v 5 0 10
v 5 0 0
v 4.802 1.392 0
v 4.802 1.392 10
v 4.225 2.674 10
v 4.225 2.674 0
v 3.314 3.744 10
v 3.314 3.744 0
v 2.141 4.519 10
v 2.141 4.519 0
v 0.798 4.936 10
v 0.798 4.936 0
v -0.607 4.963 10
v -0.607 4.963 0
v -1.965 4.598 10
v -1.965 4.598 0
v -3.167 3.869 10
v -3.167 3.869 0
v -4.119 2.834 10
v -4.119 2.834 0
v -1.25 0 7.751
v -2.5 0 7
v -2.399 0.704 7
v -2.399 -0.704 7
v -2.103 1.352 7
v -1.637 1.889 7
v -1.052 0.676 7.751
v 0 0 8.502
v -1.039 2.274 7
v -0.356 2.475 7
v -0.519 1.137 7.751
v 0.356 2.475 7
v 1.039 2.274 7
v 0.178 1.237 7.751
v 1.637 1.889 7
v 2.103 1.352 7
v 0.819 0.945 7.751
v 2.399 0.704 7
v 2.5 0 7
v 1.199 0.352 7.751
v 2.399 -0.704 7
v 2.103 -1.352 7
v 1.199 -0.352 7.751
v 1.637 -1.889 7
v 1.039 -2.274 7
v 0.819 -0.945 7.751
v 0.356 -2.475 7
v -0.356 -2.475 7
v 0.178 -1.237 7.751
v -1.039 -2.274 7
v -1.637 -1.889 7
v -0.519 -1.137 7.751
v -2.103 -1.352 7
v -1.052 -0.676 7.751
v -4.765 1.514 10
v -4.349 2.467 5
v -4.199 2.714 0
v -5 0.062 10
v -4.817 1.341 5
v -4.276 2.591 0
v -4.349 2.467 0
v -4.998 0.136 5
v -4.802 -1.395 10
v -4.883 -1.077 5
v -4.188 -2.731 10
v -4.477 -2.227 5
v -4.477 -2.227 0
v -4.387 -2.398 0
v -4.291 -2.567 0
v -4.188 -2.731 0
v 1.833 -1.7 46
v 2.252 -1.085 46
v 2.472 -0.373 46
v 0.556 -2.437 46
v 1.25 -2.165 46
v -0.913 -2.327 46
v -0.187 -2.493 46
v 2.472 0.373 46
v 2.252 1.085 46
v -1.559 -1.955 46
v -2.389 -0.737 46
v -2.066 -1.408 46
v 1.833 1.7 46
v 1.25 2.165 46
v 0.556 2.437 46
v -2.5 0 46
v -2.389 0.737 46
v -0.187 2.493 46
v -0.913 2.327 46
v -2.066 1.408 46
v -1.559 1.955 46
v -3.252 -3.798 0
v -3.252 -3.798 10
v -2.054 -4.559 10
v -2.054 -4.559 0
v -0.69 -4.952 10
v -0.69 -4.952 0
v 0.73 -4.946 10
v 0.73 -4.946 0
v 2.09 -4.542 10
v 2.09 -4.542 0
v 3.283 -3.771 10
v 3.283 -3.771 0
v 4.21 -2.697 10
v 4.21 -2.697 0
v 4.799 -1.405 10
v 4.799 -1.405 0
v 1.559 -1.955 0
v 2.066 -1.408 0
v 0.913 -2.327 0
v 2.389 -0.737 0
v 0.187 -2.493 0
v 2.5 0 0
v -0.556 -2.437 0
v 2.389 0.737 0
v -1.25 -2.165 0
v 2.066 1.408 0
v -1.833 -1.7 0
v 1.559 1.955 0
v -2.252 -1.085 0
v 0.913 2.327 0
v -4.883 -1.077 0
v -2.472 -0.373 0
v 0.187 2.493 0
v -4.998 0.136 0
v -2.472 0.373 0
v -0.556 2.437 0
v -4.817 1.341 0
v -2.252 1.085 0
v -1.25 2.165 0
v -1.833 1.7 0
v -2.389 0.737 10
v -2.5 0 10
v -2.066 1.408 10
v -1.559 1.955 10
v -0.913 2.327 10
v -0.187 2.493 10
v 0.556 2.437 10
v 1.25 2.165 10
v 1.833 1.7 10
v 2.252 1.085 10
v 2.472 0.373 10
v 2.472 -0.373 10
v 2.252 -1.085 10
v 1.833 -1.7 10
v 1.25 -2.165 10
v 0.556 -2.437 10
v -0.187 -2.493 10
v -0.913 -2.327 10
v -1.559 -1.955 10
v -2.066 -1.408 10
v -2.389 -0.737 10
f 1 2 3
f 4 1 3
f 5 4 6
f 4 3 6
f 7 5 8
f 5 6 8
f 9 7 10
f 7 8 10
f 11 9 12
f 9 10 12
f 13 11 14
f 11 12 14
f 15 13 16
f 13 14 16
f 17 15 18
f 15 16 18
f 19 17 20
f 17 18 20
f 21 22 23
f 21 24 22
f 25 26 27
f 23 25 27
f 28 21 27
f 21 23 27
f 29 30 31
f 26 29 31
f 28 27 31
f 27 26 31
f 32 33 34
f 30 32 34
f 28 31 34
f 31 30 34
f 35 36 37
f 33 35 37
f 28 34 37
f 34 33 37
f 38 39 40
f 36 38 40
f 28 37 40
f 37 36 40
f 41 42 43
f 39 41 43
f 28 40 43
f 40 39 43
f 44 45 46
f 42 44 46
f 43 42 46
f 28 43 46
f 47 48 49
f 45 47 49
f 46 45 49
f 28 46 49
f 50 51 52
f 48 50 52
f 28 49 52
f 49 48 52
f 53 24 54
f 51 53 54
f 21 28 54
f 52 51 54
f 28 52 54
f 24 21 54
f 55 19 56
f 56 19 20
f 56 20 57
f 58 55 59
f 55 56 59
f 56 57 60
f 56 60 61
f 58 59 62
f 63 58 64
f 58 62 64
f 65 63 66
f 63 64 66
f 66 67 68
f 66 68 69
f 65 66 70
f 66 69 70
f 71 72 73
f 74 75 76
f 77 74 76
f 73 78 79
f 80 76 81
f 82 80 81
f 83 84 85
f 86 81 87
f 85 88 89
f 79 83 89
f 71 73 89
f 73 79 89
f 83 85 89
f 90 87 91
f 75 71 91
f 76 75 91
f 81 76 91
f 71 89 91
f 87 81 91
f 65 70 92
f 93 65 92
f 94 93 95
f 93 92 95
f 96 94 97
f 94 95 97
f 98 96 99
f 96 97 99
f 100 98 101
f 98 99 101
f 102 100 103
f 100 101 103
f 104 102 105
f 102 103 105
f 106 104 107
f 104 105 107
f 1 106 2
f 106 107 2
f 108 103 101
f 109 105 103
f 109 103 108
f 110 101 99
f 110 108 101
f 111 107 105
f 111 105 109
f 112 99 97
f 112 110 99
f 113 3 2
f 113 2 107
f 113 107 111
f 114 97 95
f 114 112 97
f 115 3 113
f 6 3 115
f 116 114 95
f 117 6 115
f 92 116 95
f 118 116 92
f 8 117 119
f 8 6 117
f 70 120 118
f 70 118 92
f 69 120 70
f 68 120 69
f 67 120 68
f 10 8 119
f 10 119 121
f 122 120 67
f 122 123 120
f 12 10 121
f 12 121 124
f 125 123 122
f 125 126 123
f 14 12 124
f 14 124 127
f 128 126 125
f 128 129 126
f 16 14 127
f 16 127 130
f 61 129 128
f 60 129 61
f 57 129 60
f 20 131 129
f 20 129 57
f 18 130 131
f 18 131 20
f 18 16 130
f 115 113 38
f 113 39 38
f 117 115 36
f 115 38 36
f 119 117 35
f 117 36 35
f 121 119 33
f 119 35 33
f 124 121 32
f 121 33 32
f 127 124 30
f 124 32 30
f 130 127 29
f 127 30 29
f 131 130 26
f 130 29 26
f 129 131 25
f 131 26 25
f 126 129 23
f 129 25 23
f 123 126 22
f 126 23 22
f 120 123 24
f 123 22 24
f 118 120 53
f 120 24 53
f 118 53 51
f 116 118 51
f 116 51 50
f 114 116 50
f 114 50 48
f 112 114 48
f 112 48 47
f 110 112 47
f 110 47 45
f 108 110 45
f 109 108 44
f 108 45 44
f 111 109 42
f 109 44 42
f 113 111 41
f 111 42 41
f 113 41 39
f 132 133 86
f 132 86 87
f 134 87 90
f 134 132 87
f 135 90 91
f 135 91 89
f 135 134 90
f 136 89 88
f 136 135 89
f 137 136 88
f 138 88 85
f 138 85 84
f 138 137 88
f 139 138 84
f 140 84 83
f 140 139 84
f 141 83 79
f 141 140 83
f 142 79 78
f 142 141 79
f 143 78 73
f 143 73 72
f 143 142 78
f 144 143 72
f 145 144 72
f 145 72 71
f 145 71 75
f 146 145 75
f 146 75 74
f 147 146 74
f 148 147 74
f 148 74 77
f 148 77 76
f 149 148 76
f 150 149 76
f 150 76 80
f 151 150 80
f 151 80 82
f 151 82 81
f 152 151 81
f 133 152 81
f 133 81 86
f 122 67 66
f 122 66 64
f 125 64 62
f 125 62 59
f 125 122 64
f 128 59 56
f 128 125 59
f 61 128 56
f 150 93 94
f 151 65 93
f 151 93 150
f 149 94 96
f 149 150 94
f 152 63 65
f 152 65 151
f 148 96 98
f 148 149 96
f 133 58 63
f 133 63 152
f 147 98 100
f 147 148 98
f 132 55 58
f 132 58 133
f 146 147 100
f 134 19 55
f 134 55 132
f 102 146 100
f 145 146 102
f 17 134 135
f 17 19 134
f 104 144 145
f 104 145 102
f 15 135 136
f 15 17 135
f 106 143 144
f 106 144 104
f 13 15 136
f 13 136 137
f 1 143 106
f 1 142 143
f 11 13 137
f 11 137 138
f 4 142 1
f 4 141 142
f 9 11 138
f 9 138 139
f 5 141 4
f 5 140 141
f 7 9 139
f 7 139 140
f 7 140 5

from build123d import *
from build123d.topology import SkipClean

# Parameters (mm, degrees)
ESQUISSE1_R             = 5
BASE_EXTRUSION_DEPTH    = 10
ESQUISSE2_R             = 2.5
BOSS_EXTRU_1_DEPTH      = 46
PER_AGE1_D              = 5
PER_AGE1_DEPTH          = 7
PER_AGE1_TIP            = 1.502151548
BOSS_EXTRU_2_DEPTH      = 5
ENL_V_MAT_EXTRU_1_DEPTH = 47.673600495


with BuildPart() as part:
    # Esquisse1 → Base-Extrusion (new body)
    with BuildSketch(Plane.XY):
        Circle(ESQUISSE1_R)
    extrude(amount=BASE_EXTRUSION_DEPTH)

    # Esquisse2 → Boss.-Extru.1 (add)
    with BuildSketch(Plane(origin=(0, 0, 0), x_dir=(-1, 0, 0), z_dir=(0, 0, -1))):
        Circle(ESQUISSE2_R)
    extrude(amount=-BOSS_EXTRU_1_DEPTH)

    # Perçage1
    with Locations(Plane(origin=(0, 0, 0), x_dir=(-1, 0, 0), z_dir=(0, 0, -1))):
        with Locations((0, 0)):
            Hole(PER_AGE1_D / 2, depth=PER_AGE1_DEPTH)
            with Locations((0, 0, -(PER_AGE1_DEPTH + PER_AGE1_TIP / 2))):  # 118° drill point
                Cone(0, PER_AGE1_D / 2, PER_AGE1_TIP, mode=Mode.SUBTRACT)

    # Esquisse5 → Boss.-Extru.2 (add)
    with BuildSketch(Plane(origin=(0, 0, 0), x_dir=(-1, 0, 0), z_dir=(0, 0, -1))):
        with BuildLine():
            Line((4.34918251, 2.466700528), (6.117596195, 2.466700528))
            Line((6.117596195, 2.466700528), (6.117596195, -2.226545612))
            Line((6.117596195, -2.226545612), (4.476884479, -2.226545612))
            ThreePointArc((4.476884479, -2.226545612), (4.998150103, 0.135998324), (4.34918251, 2.466700528))
        make_face()
    extrude(amount=-BOSS_EXTRU_2_DEPTH)

    # Esquisse8 → Enlèv. mat.-Extru.1 (cut, through all)
    with SkipClean():  # the faces are left unmerged after this step: merging them gives an invalid solid
        with BuildSketch(Plane(origin=(0, 0, 0), x_dir=(-1, 0, 0), z_dir=(0, 0, -1))):
            with BuildLine():
                Line((4.118975402, 2.834438505), (6.634265665, 2.834438505))
                Line((6.634265665, 2.834438505), (6.634265665, -2.731049489))
                Line((6.634265665, -2.731049489), (4.188241718, -2.731049489))
                ThreePointArc((4.188241718, -2.731049489), (4.999612807, 0.062223612), (4.118975402, 2.834438505))
            make_face()
        extrude(amount=-ENL_V_MAT_EXTRU_1_DEPTH, mode=Mode.SUBTRACT)


solid = part.part
